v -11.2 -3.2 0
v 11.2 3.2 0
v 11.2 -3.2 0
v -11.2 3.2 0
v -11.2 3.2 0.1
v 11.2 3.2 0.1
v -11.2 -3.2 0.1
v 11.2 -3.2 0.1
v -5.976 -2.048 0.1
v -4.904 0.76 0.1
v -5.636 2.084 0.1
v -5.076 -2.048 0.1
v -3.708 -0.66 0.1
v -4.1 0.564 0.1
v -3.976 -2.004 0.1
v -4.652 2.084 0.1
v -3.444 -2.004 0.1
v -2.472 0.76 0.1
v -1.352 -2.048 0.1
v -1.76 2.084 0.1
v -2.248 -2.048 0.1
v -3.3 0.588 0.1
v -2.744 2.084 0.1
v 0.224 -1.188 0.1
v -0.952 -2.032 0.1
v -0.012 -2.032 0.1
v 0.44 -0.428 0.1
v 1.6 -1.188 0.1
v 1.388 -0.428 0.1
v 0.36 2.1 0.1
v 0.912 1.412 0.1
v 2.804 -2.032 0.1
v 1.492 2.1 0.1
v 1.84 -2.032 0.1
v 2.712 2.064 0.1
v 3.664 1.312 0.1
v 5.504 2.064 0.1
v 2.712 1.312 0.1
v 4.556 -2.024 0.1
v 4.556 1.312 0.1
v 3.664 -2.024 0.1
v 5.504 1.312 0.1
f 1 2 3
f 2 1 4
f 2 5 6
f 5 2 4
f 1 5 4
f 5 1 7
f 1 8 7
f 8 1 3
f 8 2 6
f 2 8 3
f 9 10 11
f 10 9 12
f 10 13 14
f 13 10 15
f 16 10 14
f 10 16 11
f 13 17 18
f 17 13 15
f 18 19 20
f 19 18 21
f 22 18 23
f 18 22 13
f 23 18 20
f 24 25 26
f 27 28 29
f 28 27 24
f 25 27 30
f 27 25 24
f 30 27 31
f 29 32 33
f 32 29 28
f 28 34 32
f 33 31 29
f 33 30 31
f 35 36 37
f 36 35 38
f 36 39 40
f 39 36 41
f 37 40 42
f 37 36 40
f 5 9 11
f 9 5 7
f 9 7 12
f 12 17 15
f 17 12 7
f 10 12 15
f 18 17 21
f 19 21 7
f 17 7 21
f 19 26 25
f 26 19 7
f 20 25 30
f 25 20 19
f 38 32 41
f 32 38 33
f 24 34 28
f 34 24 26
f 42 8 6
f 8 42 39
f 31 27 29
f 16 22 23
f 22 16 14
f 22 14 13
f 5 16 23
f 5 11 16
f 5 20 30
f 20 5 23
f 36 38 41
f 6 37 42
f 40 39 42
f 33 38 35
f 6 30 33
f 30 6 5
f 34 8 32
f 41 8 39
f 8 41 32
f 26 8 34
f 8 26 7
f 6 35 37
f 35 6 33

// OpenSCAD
// file: ../p/box5-12.scad
use <../lib.scad>
function ldraw_lib__box5_12() = [
// 0 Box with 5 Faces without Any Edges
// 0 Name: box5-12.dat
// 0 Author: Chris Dee [cwdee]
// 0 !LDRAW_ORG Primitive UPDATE 2009-02
// 0 !LICENSE Licensed under CC BY 2.0 and CC BY 4.0 : see CAreadme.txt
// 
// 0 BFC CERTIFY CCW
  [0,"BFC","CERTIFY"],
  [0,"BFC","CCW"],
// 
// 0 !HISTORY 2009-09-03 [PTadmin] Official Update 2009-02
// 
// 
// 4 16 1 1 1 1 1 -1 -1 1 -1 -1 1 1
  [4,16,1,1,1,1,1,-1,-1,1,-1,-1,1,1],
// 4 16 -1 0 1 1 0 1 1 1 1 -1 1 1
  [4,16,-1,0,1,1,0,1,1,1,1,-1,1,1],
// 4 16 -1 0 -1 -1 0 1 -1 1 1 -1 1 -1
  [4,16,-1,0,-1,-1,0,1,-1,1,1,-1,1,-1],
// 4 16 1 0 -1 -1 0 -1 -1 1 -1 1 1 -1
  [4,16,1,0,-1,-1,0,-1,-1,1,-1,1,1,-1],
// 4 16 1 0 1 1 0 -1 1 1 -1 1 1 1
  [4,16,1,0,1,1,0,-1,1,1,-1,1,1,1],
// 0
];
module ldraw_lib__box5_12(step=0, col=false, unit=2/5, alt=false, line=0.2, solid=!$preview)
    makepoly(ldraw_lib__box5_12(), step=step, col=col, unit=unit, alt=alt, line=line, solid=solid);
ldraw_lib__box5_12(line=0.2);
// main file
use <../lib.scad>
use <../p/box5-12.scad>
function ldraw_lib__6153754g() = [
// 0 Sticker  0.8 x  2.8 with White "MAT" on Black Background
// 0 Name: 6153754g.dat
// 0 Author: Magnus Forsberg [MagFors]
// 0 !LDRAW_ORG Part UPDATE 2016-01
// 0 !LICENSE Licensed under CC BY 2.0 and CC BY 4.0 : see CAreadme.txt
// 
// 0 BFC CERTIFY CCW
  [0,"BFC","CERTIFY"],
  [0,"BFC","CCW"],
// 
// 0 !KEYWORDS Beetle, set 10252, Volkswagen, VW
// 
// 0 !HISTORY 2016-12-31 [PTadmin] Official Update 2016-01
// 
// 
// 1 16 0 -0.25 0 28 0 0 0 0.25 0 0 0 8 box5-12.dat
  [1,16,0,-0.25,0,28,0,0,0,0.25,0,0,0,8, ldraw_lib__box5_12()],
// 4 15 -14.94 -0.25 -5.12 -12.69 -0.25 -5.12 -12.26 -0.25 1.9 -14.09 -0.25 5.21
  [4,15,-14.94,-0.25,-5.12,-12.69,-0.25,-5.12,-12.26,-0.25,1.9,-14.09,-0.25,5.21],
// 4 15 -12.26 -0.25 1.9 -9.94 -0.25 -5.01 -9.27 -0.25 -1.65 -10.25 -0.25 1.41
  [4,15,-12.26,-0.25,1.9,-9.94,-0.25,-5.01,-9.27,-0.25,-1.65,-10.25,-0.25,1.41],
// 4 15 -11.63 -0.25 5.21 -14.09 -0.25 5.21 -12.26 -0.25 1.9 -10.25 -0.25 1.41
  [4,15,-11.63,-0.25,5.21,-14.09,-0.25,5.21,-12.26,-0.25,1.9,-10.25,-0.25,1.41],
// 4 15 -9.27 -0.25 -1.65 -9.94 -0.25 -5.01 -8.61 -0.25 -5.01 -6.18 -0.25 1.9
  [4,15,-9.27,-0.25,-1.65,-9.94,-0.25,-5.01,-8.61,-0.25,-5.01,-6.18,-0.25,1.9],
// 4 15 -6.18 -0.25 1.9 -5.62 -0.25 -5.12 -3.38 -0.25 -5.12 -4.4 -0.25 5.21
  [4,15,-6.18,-0.25,1.9,-5.62,-0.25,-5.12,-3.38,-0.25,-5.12,-4.4,-0.25,5.21],
// 4 15 -6.18 -0.25 1.9 -6.86 -0.25 5.21 -8.25 -0.25 1.47 -9.27 -0.25 -1.65
  [4,15,-6.18,-0.25,1.9,-6.86,-0.25,5.21,-8.25,-0.25,1.47,-9.27,-0.25,-1.65],
// 3 15 -6.86 -0.25 5.21 -6.18 -0.25 1.9 -4.4 -0.25 5.21
  [3,15,-6.86,-0.25,5.21,-6.18,-0.25,1.9,-4.4,-0.25,5.21],
// 3 15 0.56 -0.25 -2.97 -2.38 -0.25 -5.08 -0.03 -0.25 -5.08
  [3,15,0.56,-0.25,-2.97,-2.38,-0.25,-5.08,-0.03,-0.25,-5.08],
// 4 15 1.1 -0.25 -1.07 0.56 -0.25 -2.97 4 -0.25 -2.97 3.47 -0.25 -1.07
  [4,15,1.1,-0.25,-1.07,0.56,-0.25,-2.97,4,-0.25,-2.97,3.47,-0.25,-1.07],
// 4 15 -2.38 -0.25 -5.08 0.56 -0.25 -2.97 1.1 -0.25 -1.07 0.9 -0.25 5.25
  [4,15,-2.38,-0.25,-5.08,0.56,-0.25,-2.97,1.1,-0.25,-1.07,0.9,-0.25,5.25],
// 3 15 0.9 -0.25 5.25 1.1 -0.25 -1.07 2.28 -0.25 3.53
  [3,15,0.9,-0.25,5.25,1.1,-0.25,-1.07,2.28,-0.25,3.53],
// 4 15 3.47 -0.25 -1.07 4 -0.25 -2.97 7.01 -0.25 -5.08 3.73 -0.25 5.25
  [4,15,3.47,-0.25,-1.07,4,-0.25,-2.97,7.01,-0.25,-5.08,3.73,-0.25,5.25],
// 3 15 4 -0.25 -2.97 4.6 -0.25 -5.08 7.01 -0.25 -5.08
  [3,15,4,-0.25,-2.97,4.6,-0.25,-5.08,7.01,-0.25,-5.08],
// 3 15 3.73 -0.25 5.25 2.28 -0.25 3.53 3.47 -0.25 -1.07
  [3,15,3.73,-0.25,5.25,2.28,-0.25,3.53,3.47,-0.25,-1.07],
// 3 15 3.73 -0.25 5.25 0.9 -0.25 5.25 2.28 -0.25 3.53
  [3,15,3.73,-0.25,5.25,0.9,-0.25,5.25,2.28,-0.25,3.53],
// 4 15 9.16 -0.25 3.28 13.76 -0.25 5.16 6.78 -0.25 5.16 6.78 -0.25 3.28
  [4,15,9.16,-0.25,3.28,13.76,-0.25,5.16,6.78,-0.25,5.16,6.78,-0.25,3.28],
// 4 15 9.16 -0.25 3.28 9.16 -0.25 -5.06 11.39 -0.25 -5.06 11.39 -0.25 3.28
  [4,15,9.16,-0.25,3.28,9.16,-0.25,-5.06,11.39,-0.25,-5.06,11.39,-0.25,3.28],
// 3 15 13.76 -0.25 5.16 11.39 -0.25 3.28 13.76 -0.25 3.28
  [3,15,13.76,-0.25,5.16,11.39,-0.25,3.28,13.76,-0.25,3.28],
// 3 15 13.76 -0.25 5.16 9.16 -0.25 3.28 11.39 -0.25 3.28
  [3,15,13.76,-0.25,5.16,9.16,-0.25,3.28,11.39,-0.25,3.28],
// 4 0 -28 -0.25 8 -28 -0.25 -8 -14.94 -0.25 -5.12 -14.09 -0.25 5.21
  [4,0,-28,-0.25,8,-28,-0.25,-8,-14.94,-0.25,-5.12,-14.09,-0.25,5.21],
// 3 0 -14.94 -0.25 -5.12 -28 -0.25 -8 -12.69 -0.25 -5.12
  [3,0,-14.94,-0.25,-5.12,-28,-0.25,-8,-12.69,-0.25,-5.12],
// 4 0 -9.94 -0.25 -5.01 -12.69 -0.25 -5.12 -28 -0.25 -8 -8.61 -0.25 -5.01
  [4,0,-9.94,-0.25,-5.01,-12.69,-0.25,-5.12,-28,-0.25,-8,-8.61,-0.25,-5.01],
// 3 0 -12.26 -0.25 1.9 -12.69 -0.25 -5.12 -9.94 -0.25 -5.01
  [3,0,-12.26,-0.25,1.9,-12.69,-0.25,-5.12,-9.94,-0.25,-5.01],
// 3 0 -6.18 -0.25 1.9 -8.61 -0.25 -5.01 -5.62 -0.25 -5.12
  [3,0,-6.18,-0.25,1.9,-8.61,-0.25,-5.01,-5.62,-0.25,-5.12],
// 3 0 -3.38 -0.25 -5.12 -5.62 -0.25 -5.12 -28 -0.25 -8
  [3,0,-3.38,-0.25,-5.12,-5.62,-0.25,-5.12,-28,-0.25,-8],
// 3 0 -8.61 -0.25 -5.01 -28 -0.25 -8 -5.62 -0.25 -5.12
  [3,0,-8.61,-0.25,-5.01,-28,-0.25,-8,-5.62,-0.25,-5.12],
// 4 0 -2.38 -0.25 -5.08 -3.38 -0.25 -5.12 -28 -0.25 -8 -0.03 -0.25 -5.08
  [4,0,-2.38,-0.25,-5.08,-3.38,-0.25,-5.12,-28,-0.25,-8,-0.03,-0.25,-5.08],
// 4 0 -4.4 -0.25 5.21 -3.38 -0.25 -5.12 -2.38 -0.25 -5.08 0.9 -0.25 5.25
  [4,0,-4.4,-0.25,5.21,-3.38,-0.25,-5.12,-2.38,-0.25,-5.08,0.9,-0.25,5.25],
// 4 0 6.78 -0.25 3.28 3.73 -0.25 5.25 7.01 -0.25 -5.08 9.16 -0.25 -5.06
  [4,0,6.78,-0.25,3.28,3.73,-0.25,5.25,7.01,-0.25,-5.08,9.16,-0.25,-5.06],
// 4 0 -0.03 -0.25 -5.08 4.6 -0.25 -5.08 4 -0.25 -2.97 0.56 -0.25 -2.97
  [4,0,-0.03,-0.25,-5.08,4.6,-0.25,-5.08,4,-0.25,-2.97,0.56,-0.25,-2.97],
// 4 0 13.76 -0.25 3.28 11.39 -0.25 -5.06 28 -0.25 -8 28 -0.25 8
  [4,0,13.76,-0.25,3.28,11.39,-0.25,-5.06,28,-0.25,-8,28,-0.25,8],
// 3 0 2.28 -0.25 3.53 1.1 -0.25 -1.07 3.47 -0.25 -1.07
  [3,0,2.28,-0.25,3.53,1.1,-0.25,-1.07,3.47,-0.25,-1.07],
// 4 0 -11.63 -0.25 5.21 -10.25 -0.25 1.41 -8.25 -0.25 1.47 -6.86 -0.25 5.21
  [4,0,-11.63,-0.25,5.21,-10.25,-0.25,1.41,-8.25,-0.25,1.47,-6.86,-0.25,5.21],
// 3 0 -8.25 -0.25 1.47 -10.25 -0.25 1.41 -9.27 -0.25 -1.65
  [3,0,-8.25,-0.25,1.47,-10.25,-0.25,1.41,-9.27,-0.25,-1.65],
// 3 0 -28 -0.25 8 -11.63 -0.25 5.21 -6.86 -0.25 5.21
  [3,0,-28,-0.25,8,-11.63,-0.25,5.21,-6.86,-0.25,5.21],
// 3 0 -28 -0.25 8 -14.09 -0.25 5.21 -11.63 -0.25 5.21
  [3,0,-28,-0.25,8,-14.09,-0.25,5.21,-11.63,-0.25,5.21],
// 4 0 -28 -0.25 8 -6.86 -0.25 5.21 -4.4 -0.25 5.21 0.9 -0.25 5.25
  [4,0,-28,-0.25,8,-6.86,-0.25,5.21,-4.4,-0.25,5.21,0.9,-0.25,5.25],
// 3 0 9.16 -0.25 3.28 6.78 -0.25 3.28 9.16 -0.25 -5.06
  [3,0,9.16,-0.25,3.28,6.78,-0.25,3.28,9.16,-0.25,-5.06],
// 3 0 28 -0.25 8 13.76 -0.25 5.16 13.76 -0.25 3.28
  [3,0,28,-0.25,8,13.76,-0.25,5.16,13.76,-0.25,3.28],
// 3 0 11.39 -0.25 3.28 11.39 -0.25 -5.06 13.76 -0.25 3.28
  [3,0,11.39,-0.25,3.28,11.39,-0.25,-5.06,13.76,-0.25,3.28],
// 3 0 3.73 -0.25 5.25 6.78 -0.25 3.28 6.78 -0.25 5.16
  [3,0,3.73,-0.25,5.25,6.78,-0.25,3.28,6.78,-0.25,5.16],
// 4 0 0.9 -0.25 5.25 3.73 -0.25 5.25 28 -0.25 8 -28 -0.25 8
  [4,0,0.9,-0.25,5.25,3.73,-0.25,5.25,28,-0.25,8,-28,-0.25,8],
// 3 0 4.6 -0.25 -5.08 28 -0.25 -8 7.01 -0.25 -5.08
  [3,0,4.6,-0.25,-5.08,28,-0.25,-8,7.01,-0.25,-5.08],
// 4 0 28 -0.25 -8 11.39 -0.25 -5.06 9.16 -0.25 -5.06 7.01 -0.25 -5.08
  [4,0,28,-0.25,-8,11.39,-0.25,-5.06,9.16,-0.25,-5.06,7.01,-0.25,-5.08],
// 4 0 28 -0.25 -8 4.6 -0.25 -5.08 -0.03 -0.25 -5.08 -28 -0.25 -8
  [4,0,28,-0.25,-8,4.6,-0.25,-5.08,-0.03,-0.25,-5.08,-28,-0.25,-8],
// 4 0 6.78 -0.25 5.16 13.76 -0.25 5.16 28 -0.25 8 3.73 -0.25 5.25
  [4,0,6.78,-0.25,5.16,13.76,-0.25,5.16,28,-0.25,8,3.73,-0.25,5.25],
];
module ldraw_lib__6153754g(step=0, col=false, unit=2/5, alt=false, line=0.2, solid=!$preview)
    makepoly(ldraw_lib__6153754g(), step=step, col=col, unit=unit, alt=alt, line=line, solid=solid);
ldraw_lib__6153754g(line=0.2);
